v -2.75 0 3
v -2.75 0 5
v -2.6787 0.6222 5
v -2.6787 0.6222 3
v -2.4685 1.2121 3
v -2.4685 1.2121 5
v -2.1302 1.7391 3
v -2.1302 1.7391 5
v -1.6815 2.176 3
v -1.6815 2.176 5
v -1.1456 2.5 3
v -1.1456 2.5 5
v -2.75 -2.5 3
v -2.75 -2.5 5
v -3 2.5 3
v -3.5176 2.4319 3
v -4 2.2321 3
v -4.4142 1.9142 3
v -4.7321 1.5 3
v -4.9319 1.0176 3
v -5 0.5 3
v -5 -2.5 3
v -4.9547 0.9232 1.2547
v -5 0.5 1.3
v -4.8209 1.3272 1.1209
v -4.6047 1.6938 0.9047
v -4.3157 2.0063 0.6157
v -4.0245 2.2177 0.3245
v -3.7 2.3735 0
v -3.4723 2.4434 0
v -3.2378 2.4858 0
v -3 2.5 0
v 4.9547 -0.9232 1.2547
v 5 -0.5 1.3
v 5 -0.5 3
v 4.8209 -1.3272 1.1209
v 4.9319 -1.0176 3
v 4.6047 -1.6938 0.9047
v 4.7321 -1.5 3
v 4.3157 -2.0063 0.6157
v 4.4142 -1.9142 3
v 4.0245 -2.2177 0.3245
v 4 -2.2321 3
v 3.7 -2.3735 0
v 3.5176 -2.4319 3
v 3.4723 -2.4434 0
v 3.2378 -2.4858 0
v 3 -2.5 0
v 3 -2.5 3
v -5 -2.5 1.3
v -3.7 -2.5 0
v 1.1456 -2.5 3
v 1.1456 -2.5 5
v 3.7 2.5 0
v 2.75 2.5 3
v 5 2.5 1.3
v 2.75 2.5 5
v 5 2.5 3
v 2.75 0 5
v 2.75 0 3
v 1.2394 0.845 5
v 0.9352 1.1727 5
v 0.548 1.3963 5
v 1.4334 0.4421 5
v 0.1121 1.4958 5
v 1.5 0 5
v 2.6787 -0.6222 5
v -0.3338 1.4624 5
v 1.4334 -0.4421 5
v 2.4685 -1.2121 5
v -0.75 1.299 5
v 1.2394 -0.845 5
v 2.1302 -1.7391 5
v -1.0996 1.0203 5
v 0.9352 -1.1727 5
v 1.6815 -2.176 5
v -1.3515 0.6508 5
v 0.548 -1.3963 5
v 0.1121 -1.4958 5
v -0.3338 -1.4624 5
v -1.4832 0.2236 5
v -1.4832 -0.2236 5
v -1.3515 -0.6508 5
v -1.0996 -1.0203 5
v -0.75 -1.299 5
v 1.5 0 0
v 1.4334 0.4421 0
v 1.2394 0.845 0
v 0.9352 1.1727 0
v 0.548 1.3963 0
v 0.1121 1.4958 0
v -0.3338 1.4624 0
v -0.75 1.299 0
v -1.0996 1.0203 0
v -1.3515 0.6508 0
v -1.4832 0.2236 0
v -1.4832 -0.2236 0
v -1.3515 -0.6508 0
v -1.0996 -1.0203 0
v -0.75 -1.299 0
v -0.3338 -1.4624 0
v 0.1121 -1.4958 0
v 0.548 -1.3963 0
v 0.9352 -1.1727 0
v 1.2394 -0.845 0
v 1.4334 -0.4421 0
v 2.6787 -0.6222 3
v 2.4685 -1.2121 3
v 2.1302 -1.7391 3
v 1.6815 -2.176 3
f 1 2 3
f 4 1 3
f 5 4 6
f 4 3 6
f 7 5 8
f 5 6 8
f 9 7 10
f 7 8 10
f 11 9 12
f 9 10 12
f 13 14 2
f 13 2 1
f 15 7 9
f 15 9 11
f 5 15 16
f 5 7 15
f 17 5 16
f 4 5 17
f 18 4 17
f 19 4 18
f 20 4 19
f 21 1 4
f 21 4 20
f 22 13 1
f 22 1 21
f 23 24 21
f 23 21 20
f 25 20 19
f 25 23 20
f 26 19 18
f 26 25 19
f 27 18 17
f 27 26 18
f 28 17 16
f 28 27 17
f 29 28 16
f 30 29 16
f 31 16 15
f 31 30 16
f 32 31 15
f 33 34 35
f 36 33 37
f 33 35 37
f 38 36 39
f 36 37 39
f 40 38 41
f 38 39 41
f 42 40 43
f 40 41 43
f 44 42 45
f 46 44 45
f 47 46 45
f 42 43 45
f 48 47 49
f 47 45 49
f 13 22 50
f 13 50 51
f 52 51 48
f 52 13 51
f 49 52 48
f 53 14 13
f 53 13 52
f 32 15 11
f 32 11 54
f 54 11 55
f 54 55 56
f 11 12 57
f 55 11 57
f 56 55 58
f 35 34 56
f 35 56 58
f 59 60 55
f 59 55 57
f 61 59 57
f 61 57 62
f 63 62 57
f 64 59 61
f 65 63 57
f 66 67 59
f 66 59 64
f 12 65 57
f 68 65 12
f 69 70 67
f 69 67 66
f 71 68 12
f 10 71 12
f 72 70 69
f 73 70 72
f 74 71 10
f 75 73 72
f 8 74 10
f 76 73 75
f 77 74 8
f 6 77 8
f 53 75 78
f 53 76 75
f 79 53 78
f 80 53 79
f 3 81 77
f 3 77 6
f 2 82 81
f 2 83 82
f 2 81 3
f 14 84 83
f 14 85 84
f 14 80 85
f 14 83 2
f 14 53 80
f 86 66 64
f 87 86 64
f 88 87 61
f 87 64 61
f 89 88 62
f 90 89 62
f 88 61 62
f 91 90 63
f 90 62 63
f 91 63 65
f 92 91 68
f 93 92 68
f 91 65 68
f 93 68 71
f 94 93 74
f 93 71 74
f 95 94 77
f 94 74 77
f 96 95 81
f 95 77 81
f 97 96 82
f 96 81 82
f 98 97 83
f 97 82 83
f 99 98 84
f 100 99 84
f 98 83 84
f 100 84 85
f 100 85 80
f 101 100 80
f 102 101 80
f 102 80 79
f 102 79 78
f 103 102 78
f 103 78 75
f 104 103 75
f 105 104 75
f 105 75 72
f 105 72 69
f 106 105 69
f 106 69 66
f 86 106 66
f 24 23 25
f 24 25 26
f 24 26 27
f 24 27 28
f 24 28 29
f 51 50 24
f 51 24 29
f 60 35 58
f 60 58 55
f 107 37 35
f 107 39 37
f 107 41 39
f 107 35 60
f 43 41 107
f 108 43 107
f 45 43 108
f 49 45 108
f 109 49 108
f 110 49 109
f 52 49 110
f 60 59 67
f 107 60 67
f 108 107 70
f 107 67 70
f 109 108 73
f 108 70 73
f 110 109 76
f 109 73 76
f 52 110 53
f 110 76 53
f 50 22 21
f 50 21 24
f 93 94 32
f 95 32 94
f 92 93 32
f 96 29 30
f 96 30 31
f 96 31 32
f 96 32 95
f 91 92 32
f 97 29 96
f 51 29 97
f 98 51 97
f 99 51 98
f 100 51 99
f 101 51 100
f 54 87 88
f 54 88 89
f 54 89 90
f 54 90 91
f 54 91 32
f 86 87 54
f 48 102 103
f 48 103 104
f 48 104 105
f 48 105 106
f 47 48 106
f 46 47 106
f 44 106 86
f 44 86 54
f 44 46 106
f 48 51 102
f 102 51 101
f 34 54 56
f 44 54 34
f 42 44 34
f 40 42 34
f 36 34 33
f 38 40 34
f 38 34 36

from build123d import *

# Parameters (mm, degrees)
F1_DEPTH      = 2.5
F1_DEPTH_BACK = 2.5
F3_R          = 1.5
F4_DEPTH      = 5.001
F6_DEPTH      = 2
F7_R          = 2


with BuildPart() as f1:
    # F0 (on Front) → F1 (new body, two sides)
    with BuildSketch(Plane.XZ) as f1_sk:
        Polygon((-3.7, 0), (0, 0), (3.7, 0), (5, 1.3), (5, 3), (2.75, 3), (2.75, 5), (0, 5), (-2.75, 5), (-2.75, 3), (-5, 3), (-5, 1.3), align=None)
    extrude(amount=F1_DEPTH)
    extrude(f1_sk.sketch, amount=-F1_DEPTH_BACK)

    # F3 (on face) → F4 (cut, through all)
    with BuildSketch(Plane.XY.offset(5)):
        Circle(F3_R)
    extrude(amount=-F4_DEPTH, mode=Mode.SUBTRACT)

    # F5 (on face) → F6 (cut, through all)
    with BuildSketch(Plane.XY.offset(5)):
        with BuildLine():
            Line((2.75, -2.5), (2.75, 0))
            ThreePointArc((2.75, 0), (2.314413618, -1.4852574204), (1.1456439237, -2.5))
            Line((1.1456439237, -2.5), (2.75, -2.5))
        make_face()
        with BuildLine():
            ThreePointArc((-2.75, 0), (-2.314413618, 1.4852574204), (-1.1456439237, 2.5))
            Line((-1.1456439237, 2.5), (-2.75, 2.5))
            Line((-2.75, 2.5), (-2.75, 0))
        make_face()
    extrude(amount=-F6_DEPTH, mode=Mode.SUBTRACT)

    # F7
    f7_edges = [f1.edges().sort_by_distance(p)[0] for p in [
        (5, -2.5, 2.15),
        (-5, 2.5, 2.15),
    ]]
    fillet(f7_edges, radius=F7_R)


solid = f1.part
